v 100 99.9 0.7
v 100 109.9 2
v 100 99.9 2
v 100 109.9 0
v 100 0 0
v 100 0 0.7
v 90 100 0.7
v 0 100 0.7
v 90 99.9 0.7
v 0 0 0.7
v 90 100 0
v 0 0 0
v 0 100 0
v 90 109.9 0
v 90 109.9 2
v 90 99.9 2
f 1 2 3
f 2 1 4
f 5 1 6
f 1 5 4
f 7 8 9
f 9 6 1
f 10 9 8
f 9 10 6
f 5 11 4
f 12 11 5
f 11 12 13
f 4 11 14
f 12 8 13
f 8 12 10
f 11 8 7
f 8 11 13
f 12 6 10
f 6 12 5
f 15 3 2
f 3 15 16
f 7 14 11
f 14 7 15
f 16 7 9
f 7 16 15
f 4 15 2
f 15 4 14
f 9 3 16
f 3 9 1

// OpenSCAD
/*difference () {
    cube([240, 240, 10]);
    #translate([-10,-10,0.2]) color([0,1,0]) linear_extrude(height=10) scale([1,1, 1]) import("test_map.dxf");
}*/
union() {
    // 100 dots per inch, with 12 inch size -> 1200 dots
    // Openscad makes each dot 1mm, so if we want this to be 200mm/200mm
    // it must be 200 dpi / 1200 dots -> 1/6 the size
    scale([1/6,1/6,0.07]) surface(file = "test_map.png");
    translate([0, 0, 0]) cube([100,100,0.7]);
    translate([90,99.9,0]) cube([10,10,2]);
}
